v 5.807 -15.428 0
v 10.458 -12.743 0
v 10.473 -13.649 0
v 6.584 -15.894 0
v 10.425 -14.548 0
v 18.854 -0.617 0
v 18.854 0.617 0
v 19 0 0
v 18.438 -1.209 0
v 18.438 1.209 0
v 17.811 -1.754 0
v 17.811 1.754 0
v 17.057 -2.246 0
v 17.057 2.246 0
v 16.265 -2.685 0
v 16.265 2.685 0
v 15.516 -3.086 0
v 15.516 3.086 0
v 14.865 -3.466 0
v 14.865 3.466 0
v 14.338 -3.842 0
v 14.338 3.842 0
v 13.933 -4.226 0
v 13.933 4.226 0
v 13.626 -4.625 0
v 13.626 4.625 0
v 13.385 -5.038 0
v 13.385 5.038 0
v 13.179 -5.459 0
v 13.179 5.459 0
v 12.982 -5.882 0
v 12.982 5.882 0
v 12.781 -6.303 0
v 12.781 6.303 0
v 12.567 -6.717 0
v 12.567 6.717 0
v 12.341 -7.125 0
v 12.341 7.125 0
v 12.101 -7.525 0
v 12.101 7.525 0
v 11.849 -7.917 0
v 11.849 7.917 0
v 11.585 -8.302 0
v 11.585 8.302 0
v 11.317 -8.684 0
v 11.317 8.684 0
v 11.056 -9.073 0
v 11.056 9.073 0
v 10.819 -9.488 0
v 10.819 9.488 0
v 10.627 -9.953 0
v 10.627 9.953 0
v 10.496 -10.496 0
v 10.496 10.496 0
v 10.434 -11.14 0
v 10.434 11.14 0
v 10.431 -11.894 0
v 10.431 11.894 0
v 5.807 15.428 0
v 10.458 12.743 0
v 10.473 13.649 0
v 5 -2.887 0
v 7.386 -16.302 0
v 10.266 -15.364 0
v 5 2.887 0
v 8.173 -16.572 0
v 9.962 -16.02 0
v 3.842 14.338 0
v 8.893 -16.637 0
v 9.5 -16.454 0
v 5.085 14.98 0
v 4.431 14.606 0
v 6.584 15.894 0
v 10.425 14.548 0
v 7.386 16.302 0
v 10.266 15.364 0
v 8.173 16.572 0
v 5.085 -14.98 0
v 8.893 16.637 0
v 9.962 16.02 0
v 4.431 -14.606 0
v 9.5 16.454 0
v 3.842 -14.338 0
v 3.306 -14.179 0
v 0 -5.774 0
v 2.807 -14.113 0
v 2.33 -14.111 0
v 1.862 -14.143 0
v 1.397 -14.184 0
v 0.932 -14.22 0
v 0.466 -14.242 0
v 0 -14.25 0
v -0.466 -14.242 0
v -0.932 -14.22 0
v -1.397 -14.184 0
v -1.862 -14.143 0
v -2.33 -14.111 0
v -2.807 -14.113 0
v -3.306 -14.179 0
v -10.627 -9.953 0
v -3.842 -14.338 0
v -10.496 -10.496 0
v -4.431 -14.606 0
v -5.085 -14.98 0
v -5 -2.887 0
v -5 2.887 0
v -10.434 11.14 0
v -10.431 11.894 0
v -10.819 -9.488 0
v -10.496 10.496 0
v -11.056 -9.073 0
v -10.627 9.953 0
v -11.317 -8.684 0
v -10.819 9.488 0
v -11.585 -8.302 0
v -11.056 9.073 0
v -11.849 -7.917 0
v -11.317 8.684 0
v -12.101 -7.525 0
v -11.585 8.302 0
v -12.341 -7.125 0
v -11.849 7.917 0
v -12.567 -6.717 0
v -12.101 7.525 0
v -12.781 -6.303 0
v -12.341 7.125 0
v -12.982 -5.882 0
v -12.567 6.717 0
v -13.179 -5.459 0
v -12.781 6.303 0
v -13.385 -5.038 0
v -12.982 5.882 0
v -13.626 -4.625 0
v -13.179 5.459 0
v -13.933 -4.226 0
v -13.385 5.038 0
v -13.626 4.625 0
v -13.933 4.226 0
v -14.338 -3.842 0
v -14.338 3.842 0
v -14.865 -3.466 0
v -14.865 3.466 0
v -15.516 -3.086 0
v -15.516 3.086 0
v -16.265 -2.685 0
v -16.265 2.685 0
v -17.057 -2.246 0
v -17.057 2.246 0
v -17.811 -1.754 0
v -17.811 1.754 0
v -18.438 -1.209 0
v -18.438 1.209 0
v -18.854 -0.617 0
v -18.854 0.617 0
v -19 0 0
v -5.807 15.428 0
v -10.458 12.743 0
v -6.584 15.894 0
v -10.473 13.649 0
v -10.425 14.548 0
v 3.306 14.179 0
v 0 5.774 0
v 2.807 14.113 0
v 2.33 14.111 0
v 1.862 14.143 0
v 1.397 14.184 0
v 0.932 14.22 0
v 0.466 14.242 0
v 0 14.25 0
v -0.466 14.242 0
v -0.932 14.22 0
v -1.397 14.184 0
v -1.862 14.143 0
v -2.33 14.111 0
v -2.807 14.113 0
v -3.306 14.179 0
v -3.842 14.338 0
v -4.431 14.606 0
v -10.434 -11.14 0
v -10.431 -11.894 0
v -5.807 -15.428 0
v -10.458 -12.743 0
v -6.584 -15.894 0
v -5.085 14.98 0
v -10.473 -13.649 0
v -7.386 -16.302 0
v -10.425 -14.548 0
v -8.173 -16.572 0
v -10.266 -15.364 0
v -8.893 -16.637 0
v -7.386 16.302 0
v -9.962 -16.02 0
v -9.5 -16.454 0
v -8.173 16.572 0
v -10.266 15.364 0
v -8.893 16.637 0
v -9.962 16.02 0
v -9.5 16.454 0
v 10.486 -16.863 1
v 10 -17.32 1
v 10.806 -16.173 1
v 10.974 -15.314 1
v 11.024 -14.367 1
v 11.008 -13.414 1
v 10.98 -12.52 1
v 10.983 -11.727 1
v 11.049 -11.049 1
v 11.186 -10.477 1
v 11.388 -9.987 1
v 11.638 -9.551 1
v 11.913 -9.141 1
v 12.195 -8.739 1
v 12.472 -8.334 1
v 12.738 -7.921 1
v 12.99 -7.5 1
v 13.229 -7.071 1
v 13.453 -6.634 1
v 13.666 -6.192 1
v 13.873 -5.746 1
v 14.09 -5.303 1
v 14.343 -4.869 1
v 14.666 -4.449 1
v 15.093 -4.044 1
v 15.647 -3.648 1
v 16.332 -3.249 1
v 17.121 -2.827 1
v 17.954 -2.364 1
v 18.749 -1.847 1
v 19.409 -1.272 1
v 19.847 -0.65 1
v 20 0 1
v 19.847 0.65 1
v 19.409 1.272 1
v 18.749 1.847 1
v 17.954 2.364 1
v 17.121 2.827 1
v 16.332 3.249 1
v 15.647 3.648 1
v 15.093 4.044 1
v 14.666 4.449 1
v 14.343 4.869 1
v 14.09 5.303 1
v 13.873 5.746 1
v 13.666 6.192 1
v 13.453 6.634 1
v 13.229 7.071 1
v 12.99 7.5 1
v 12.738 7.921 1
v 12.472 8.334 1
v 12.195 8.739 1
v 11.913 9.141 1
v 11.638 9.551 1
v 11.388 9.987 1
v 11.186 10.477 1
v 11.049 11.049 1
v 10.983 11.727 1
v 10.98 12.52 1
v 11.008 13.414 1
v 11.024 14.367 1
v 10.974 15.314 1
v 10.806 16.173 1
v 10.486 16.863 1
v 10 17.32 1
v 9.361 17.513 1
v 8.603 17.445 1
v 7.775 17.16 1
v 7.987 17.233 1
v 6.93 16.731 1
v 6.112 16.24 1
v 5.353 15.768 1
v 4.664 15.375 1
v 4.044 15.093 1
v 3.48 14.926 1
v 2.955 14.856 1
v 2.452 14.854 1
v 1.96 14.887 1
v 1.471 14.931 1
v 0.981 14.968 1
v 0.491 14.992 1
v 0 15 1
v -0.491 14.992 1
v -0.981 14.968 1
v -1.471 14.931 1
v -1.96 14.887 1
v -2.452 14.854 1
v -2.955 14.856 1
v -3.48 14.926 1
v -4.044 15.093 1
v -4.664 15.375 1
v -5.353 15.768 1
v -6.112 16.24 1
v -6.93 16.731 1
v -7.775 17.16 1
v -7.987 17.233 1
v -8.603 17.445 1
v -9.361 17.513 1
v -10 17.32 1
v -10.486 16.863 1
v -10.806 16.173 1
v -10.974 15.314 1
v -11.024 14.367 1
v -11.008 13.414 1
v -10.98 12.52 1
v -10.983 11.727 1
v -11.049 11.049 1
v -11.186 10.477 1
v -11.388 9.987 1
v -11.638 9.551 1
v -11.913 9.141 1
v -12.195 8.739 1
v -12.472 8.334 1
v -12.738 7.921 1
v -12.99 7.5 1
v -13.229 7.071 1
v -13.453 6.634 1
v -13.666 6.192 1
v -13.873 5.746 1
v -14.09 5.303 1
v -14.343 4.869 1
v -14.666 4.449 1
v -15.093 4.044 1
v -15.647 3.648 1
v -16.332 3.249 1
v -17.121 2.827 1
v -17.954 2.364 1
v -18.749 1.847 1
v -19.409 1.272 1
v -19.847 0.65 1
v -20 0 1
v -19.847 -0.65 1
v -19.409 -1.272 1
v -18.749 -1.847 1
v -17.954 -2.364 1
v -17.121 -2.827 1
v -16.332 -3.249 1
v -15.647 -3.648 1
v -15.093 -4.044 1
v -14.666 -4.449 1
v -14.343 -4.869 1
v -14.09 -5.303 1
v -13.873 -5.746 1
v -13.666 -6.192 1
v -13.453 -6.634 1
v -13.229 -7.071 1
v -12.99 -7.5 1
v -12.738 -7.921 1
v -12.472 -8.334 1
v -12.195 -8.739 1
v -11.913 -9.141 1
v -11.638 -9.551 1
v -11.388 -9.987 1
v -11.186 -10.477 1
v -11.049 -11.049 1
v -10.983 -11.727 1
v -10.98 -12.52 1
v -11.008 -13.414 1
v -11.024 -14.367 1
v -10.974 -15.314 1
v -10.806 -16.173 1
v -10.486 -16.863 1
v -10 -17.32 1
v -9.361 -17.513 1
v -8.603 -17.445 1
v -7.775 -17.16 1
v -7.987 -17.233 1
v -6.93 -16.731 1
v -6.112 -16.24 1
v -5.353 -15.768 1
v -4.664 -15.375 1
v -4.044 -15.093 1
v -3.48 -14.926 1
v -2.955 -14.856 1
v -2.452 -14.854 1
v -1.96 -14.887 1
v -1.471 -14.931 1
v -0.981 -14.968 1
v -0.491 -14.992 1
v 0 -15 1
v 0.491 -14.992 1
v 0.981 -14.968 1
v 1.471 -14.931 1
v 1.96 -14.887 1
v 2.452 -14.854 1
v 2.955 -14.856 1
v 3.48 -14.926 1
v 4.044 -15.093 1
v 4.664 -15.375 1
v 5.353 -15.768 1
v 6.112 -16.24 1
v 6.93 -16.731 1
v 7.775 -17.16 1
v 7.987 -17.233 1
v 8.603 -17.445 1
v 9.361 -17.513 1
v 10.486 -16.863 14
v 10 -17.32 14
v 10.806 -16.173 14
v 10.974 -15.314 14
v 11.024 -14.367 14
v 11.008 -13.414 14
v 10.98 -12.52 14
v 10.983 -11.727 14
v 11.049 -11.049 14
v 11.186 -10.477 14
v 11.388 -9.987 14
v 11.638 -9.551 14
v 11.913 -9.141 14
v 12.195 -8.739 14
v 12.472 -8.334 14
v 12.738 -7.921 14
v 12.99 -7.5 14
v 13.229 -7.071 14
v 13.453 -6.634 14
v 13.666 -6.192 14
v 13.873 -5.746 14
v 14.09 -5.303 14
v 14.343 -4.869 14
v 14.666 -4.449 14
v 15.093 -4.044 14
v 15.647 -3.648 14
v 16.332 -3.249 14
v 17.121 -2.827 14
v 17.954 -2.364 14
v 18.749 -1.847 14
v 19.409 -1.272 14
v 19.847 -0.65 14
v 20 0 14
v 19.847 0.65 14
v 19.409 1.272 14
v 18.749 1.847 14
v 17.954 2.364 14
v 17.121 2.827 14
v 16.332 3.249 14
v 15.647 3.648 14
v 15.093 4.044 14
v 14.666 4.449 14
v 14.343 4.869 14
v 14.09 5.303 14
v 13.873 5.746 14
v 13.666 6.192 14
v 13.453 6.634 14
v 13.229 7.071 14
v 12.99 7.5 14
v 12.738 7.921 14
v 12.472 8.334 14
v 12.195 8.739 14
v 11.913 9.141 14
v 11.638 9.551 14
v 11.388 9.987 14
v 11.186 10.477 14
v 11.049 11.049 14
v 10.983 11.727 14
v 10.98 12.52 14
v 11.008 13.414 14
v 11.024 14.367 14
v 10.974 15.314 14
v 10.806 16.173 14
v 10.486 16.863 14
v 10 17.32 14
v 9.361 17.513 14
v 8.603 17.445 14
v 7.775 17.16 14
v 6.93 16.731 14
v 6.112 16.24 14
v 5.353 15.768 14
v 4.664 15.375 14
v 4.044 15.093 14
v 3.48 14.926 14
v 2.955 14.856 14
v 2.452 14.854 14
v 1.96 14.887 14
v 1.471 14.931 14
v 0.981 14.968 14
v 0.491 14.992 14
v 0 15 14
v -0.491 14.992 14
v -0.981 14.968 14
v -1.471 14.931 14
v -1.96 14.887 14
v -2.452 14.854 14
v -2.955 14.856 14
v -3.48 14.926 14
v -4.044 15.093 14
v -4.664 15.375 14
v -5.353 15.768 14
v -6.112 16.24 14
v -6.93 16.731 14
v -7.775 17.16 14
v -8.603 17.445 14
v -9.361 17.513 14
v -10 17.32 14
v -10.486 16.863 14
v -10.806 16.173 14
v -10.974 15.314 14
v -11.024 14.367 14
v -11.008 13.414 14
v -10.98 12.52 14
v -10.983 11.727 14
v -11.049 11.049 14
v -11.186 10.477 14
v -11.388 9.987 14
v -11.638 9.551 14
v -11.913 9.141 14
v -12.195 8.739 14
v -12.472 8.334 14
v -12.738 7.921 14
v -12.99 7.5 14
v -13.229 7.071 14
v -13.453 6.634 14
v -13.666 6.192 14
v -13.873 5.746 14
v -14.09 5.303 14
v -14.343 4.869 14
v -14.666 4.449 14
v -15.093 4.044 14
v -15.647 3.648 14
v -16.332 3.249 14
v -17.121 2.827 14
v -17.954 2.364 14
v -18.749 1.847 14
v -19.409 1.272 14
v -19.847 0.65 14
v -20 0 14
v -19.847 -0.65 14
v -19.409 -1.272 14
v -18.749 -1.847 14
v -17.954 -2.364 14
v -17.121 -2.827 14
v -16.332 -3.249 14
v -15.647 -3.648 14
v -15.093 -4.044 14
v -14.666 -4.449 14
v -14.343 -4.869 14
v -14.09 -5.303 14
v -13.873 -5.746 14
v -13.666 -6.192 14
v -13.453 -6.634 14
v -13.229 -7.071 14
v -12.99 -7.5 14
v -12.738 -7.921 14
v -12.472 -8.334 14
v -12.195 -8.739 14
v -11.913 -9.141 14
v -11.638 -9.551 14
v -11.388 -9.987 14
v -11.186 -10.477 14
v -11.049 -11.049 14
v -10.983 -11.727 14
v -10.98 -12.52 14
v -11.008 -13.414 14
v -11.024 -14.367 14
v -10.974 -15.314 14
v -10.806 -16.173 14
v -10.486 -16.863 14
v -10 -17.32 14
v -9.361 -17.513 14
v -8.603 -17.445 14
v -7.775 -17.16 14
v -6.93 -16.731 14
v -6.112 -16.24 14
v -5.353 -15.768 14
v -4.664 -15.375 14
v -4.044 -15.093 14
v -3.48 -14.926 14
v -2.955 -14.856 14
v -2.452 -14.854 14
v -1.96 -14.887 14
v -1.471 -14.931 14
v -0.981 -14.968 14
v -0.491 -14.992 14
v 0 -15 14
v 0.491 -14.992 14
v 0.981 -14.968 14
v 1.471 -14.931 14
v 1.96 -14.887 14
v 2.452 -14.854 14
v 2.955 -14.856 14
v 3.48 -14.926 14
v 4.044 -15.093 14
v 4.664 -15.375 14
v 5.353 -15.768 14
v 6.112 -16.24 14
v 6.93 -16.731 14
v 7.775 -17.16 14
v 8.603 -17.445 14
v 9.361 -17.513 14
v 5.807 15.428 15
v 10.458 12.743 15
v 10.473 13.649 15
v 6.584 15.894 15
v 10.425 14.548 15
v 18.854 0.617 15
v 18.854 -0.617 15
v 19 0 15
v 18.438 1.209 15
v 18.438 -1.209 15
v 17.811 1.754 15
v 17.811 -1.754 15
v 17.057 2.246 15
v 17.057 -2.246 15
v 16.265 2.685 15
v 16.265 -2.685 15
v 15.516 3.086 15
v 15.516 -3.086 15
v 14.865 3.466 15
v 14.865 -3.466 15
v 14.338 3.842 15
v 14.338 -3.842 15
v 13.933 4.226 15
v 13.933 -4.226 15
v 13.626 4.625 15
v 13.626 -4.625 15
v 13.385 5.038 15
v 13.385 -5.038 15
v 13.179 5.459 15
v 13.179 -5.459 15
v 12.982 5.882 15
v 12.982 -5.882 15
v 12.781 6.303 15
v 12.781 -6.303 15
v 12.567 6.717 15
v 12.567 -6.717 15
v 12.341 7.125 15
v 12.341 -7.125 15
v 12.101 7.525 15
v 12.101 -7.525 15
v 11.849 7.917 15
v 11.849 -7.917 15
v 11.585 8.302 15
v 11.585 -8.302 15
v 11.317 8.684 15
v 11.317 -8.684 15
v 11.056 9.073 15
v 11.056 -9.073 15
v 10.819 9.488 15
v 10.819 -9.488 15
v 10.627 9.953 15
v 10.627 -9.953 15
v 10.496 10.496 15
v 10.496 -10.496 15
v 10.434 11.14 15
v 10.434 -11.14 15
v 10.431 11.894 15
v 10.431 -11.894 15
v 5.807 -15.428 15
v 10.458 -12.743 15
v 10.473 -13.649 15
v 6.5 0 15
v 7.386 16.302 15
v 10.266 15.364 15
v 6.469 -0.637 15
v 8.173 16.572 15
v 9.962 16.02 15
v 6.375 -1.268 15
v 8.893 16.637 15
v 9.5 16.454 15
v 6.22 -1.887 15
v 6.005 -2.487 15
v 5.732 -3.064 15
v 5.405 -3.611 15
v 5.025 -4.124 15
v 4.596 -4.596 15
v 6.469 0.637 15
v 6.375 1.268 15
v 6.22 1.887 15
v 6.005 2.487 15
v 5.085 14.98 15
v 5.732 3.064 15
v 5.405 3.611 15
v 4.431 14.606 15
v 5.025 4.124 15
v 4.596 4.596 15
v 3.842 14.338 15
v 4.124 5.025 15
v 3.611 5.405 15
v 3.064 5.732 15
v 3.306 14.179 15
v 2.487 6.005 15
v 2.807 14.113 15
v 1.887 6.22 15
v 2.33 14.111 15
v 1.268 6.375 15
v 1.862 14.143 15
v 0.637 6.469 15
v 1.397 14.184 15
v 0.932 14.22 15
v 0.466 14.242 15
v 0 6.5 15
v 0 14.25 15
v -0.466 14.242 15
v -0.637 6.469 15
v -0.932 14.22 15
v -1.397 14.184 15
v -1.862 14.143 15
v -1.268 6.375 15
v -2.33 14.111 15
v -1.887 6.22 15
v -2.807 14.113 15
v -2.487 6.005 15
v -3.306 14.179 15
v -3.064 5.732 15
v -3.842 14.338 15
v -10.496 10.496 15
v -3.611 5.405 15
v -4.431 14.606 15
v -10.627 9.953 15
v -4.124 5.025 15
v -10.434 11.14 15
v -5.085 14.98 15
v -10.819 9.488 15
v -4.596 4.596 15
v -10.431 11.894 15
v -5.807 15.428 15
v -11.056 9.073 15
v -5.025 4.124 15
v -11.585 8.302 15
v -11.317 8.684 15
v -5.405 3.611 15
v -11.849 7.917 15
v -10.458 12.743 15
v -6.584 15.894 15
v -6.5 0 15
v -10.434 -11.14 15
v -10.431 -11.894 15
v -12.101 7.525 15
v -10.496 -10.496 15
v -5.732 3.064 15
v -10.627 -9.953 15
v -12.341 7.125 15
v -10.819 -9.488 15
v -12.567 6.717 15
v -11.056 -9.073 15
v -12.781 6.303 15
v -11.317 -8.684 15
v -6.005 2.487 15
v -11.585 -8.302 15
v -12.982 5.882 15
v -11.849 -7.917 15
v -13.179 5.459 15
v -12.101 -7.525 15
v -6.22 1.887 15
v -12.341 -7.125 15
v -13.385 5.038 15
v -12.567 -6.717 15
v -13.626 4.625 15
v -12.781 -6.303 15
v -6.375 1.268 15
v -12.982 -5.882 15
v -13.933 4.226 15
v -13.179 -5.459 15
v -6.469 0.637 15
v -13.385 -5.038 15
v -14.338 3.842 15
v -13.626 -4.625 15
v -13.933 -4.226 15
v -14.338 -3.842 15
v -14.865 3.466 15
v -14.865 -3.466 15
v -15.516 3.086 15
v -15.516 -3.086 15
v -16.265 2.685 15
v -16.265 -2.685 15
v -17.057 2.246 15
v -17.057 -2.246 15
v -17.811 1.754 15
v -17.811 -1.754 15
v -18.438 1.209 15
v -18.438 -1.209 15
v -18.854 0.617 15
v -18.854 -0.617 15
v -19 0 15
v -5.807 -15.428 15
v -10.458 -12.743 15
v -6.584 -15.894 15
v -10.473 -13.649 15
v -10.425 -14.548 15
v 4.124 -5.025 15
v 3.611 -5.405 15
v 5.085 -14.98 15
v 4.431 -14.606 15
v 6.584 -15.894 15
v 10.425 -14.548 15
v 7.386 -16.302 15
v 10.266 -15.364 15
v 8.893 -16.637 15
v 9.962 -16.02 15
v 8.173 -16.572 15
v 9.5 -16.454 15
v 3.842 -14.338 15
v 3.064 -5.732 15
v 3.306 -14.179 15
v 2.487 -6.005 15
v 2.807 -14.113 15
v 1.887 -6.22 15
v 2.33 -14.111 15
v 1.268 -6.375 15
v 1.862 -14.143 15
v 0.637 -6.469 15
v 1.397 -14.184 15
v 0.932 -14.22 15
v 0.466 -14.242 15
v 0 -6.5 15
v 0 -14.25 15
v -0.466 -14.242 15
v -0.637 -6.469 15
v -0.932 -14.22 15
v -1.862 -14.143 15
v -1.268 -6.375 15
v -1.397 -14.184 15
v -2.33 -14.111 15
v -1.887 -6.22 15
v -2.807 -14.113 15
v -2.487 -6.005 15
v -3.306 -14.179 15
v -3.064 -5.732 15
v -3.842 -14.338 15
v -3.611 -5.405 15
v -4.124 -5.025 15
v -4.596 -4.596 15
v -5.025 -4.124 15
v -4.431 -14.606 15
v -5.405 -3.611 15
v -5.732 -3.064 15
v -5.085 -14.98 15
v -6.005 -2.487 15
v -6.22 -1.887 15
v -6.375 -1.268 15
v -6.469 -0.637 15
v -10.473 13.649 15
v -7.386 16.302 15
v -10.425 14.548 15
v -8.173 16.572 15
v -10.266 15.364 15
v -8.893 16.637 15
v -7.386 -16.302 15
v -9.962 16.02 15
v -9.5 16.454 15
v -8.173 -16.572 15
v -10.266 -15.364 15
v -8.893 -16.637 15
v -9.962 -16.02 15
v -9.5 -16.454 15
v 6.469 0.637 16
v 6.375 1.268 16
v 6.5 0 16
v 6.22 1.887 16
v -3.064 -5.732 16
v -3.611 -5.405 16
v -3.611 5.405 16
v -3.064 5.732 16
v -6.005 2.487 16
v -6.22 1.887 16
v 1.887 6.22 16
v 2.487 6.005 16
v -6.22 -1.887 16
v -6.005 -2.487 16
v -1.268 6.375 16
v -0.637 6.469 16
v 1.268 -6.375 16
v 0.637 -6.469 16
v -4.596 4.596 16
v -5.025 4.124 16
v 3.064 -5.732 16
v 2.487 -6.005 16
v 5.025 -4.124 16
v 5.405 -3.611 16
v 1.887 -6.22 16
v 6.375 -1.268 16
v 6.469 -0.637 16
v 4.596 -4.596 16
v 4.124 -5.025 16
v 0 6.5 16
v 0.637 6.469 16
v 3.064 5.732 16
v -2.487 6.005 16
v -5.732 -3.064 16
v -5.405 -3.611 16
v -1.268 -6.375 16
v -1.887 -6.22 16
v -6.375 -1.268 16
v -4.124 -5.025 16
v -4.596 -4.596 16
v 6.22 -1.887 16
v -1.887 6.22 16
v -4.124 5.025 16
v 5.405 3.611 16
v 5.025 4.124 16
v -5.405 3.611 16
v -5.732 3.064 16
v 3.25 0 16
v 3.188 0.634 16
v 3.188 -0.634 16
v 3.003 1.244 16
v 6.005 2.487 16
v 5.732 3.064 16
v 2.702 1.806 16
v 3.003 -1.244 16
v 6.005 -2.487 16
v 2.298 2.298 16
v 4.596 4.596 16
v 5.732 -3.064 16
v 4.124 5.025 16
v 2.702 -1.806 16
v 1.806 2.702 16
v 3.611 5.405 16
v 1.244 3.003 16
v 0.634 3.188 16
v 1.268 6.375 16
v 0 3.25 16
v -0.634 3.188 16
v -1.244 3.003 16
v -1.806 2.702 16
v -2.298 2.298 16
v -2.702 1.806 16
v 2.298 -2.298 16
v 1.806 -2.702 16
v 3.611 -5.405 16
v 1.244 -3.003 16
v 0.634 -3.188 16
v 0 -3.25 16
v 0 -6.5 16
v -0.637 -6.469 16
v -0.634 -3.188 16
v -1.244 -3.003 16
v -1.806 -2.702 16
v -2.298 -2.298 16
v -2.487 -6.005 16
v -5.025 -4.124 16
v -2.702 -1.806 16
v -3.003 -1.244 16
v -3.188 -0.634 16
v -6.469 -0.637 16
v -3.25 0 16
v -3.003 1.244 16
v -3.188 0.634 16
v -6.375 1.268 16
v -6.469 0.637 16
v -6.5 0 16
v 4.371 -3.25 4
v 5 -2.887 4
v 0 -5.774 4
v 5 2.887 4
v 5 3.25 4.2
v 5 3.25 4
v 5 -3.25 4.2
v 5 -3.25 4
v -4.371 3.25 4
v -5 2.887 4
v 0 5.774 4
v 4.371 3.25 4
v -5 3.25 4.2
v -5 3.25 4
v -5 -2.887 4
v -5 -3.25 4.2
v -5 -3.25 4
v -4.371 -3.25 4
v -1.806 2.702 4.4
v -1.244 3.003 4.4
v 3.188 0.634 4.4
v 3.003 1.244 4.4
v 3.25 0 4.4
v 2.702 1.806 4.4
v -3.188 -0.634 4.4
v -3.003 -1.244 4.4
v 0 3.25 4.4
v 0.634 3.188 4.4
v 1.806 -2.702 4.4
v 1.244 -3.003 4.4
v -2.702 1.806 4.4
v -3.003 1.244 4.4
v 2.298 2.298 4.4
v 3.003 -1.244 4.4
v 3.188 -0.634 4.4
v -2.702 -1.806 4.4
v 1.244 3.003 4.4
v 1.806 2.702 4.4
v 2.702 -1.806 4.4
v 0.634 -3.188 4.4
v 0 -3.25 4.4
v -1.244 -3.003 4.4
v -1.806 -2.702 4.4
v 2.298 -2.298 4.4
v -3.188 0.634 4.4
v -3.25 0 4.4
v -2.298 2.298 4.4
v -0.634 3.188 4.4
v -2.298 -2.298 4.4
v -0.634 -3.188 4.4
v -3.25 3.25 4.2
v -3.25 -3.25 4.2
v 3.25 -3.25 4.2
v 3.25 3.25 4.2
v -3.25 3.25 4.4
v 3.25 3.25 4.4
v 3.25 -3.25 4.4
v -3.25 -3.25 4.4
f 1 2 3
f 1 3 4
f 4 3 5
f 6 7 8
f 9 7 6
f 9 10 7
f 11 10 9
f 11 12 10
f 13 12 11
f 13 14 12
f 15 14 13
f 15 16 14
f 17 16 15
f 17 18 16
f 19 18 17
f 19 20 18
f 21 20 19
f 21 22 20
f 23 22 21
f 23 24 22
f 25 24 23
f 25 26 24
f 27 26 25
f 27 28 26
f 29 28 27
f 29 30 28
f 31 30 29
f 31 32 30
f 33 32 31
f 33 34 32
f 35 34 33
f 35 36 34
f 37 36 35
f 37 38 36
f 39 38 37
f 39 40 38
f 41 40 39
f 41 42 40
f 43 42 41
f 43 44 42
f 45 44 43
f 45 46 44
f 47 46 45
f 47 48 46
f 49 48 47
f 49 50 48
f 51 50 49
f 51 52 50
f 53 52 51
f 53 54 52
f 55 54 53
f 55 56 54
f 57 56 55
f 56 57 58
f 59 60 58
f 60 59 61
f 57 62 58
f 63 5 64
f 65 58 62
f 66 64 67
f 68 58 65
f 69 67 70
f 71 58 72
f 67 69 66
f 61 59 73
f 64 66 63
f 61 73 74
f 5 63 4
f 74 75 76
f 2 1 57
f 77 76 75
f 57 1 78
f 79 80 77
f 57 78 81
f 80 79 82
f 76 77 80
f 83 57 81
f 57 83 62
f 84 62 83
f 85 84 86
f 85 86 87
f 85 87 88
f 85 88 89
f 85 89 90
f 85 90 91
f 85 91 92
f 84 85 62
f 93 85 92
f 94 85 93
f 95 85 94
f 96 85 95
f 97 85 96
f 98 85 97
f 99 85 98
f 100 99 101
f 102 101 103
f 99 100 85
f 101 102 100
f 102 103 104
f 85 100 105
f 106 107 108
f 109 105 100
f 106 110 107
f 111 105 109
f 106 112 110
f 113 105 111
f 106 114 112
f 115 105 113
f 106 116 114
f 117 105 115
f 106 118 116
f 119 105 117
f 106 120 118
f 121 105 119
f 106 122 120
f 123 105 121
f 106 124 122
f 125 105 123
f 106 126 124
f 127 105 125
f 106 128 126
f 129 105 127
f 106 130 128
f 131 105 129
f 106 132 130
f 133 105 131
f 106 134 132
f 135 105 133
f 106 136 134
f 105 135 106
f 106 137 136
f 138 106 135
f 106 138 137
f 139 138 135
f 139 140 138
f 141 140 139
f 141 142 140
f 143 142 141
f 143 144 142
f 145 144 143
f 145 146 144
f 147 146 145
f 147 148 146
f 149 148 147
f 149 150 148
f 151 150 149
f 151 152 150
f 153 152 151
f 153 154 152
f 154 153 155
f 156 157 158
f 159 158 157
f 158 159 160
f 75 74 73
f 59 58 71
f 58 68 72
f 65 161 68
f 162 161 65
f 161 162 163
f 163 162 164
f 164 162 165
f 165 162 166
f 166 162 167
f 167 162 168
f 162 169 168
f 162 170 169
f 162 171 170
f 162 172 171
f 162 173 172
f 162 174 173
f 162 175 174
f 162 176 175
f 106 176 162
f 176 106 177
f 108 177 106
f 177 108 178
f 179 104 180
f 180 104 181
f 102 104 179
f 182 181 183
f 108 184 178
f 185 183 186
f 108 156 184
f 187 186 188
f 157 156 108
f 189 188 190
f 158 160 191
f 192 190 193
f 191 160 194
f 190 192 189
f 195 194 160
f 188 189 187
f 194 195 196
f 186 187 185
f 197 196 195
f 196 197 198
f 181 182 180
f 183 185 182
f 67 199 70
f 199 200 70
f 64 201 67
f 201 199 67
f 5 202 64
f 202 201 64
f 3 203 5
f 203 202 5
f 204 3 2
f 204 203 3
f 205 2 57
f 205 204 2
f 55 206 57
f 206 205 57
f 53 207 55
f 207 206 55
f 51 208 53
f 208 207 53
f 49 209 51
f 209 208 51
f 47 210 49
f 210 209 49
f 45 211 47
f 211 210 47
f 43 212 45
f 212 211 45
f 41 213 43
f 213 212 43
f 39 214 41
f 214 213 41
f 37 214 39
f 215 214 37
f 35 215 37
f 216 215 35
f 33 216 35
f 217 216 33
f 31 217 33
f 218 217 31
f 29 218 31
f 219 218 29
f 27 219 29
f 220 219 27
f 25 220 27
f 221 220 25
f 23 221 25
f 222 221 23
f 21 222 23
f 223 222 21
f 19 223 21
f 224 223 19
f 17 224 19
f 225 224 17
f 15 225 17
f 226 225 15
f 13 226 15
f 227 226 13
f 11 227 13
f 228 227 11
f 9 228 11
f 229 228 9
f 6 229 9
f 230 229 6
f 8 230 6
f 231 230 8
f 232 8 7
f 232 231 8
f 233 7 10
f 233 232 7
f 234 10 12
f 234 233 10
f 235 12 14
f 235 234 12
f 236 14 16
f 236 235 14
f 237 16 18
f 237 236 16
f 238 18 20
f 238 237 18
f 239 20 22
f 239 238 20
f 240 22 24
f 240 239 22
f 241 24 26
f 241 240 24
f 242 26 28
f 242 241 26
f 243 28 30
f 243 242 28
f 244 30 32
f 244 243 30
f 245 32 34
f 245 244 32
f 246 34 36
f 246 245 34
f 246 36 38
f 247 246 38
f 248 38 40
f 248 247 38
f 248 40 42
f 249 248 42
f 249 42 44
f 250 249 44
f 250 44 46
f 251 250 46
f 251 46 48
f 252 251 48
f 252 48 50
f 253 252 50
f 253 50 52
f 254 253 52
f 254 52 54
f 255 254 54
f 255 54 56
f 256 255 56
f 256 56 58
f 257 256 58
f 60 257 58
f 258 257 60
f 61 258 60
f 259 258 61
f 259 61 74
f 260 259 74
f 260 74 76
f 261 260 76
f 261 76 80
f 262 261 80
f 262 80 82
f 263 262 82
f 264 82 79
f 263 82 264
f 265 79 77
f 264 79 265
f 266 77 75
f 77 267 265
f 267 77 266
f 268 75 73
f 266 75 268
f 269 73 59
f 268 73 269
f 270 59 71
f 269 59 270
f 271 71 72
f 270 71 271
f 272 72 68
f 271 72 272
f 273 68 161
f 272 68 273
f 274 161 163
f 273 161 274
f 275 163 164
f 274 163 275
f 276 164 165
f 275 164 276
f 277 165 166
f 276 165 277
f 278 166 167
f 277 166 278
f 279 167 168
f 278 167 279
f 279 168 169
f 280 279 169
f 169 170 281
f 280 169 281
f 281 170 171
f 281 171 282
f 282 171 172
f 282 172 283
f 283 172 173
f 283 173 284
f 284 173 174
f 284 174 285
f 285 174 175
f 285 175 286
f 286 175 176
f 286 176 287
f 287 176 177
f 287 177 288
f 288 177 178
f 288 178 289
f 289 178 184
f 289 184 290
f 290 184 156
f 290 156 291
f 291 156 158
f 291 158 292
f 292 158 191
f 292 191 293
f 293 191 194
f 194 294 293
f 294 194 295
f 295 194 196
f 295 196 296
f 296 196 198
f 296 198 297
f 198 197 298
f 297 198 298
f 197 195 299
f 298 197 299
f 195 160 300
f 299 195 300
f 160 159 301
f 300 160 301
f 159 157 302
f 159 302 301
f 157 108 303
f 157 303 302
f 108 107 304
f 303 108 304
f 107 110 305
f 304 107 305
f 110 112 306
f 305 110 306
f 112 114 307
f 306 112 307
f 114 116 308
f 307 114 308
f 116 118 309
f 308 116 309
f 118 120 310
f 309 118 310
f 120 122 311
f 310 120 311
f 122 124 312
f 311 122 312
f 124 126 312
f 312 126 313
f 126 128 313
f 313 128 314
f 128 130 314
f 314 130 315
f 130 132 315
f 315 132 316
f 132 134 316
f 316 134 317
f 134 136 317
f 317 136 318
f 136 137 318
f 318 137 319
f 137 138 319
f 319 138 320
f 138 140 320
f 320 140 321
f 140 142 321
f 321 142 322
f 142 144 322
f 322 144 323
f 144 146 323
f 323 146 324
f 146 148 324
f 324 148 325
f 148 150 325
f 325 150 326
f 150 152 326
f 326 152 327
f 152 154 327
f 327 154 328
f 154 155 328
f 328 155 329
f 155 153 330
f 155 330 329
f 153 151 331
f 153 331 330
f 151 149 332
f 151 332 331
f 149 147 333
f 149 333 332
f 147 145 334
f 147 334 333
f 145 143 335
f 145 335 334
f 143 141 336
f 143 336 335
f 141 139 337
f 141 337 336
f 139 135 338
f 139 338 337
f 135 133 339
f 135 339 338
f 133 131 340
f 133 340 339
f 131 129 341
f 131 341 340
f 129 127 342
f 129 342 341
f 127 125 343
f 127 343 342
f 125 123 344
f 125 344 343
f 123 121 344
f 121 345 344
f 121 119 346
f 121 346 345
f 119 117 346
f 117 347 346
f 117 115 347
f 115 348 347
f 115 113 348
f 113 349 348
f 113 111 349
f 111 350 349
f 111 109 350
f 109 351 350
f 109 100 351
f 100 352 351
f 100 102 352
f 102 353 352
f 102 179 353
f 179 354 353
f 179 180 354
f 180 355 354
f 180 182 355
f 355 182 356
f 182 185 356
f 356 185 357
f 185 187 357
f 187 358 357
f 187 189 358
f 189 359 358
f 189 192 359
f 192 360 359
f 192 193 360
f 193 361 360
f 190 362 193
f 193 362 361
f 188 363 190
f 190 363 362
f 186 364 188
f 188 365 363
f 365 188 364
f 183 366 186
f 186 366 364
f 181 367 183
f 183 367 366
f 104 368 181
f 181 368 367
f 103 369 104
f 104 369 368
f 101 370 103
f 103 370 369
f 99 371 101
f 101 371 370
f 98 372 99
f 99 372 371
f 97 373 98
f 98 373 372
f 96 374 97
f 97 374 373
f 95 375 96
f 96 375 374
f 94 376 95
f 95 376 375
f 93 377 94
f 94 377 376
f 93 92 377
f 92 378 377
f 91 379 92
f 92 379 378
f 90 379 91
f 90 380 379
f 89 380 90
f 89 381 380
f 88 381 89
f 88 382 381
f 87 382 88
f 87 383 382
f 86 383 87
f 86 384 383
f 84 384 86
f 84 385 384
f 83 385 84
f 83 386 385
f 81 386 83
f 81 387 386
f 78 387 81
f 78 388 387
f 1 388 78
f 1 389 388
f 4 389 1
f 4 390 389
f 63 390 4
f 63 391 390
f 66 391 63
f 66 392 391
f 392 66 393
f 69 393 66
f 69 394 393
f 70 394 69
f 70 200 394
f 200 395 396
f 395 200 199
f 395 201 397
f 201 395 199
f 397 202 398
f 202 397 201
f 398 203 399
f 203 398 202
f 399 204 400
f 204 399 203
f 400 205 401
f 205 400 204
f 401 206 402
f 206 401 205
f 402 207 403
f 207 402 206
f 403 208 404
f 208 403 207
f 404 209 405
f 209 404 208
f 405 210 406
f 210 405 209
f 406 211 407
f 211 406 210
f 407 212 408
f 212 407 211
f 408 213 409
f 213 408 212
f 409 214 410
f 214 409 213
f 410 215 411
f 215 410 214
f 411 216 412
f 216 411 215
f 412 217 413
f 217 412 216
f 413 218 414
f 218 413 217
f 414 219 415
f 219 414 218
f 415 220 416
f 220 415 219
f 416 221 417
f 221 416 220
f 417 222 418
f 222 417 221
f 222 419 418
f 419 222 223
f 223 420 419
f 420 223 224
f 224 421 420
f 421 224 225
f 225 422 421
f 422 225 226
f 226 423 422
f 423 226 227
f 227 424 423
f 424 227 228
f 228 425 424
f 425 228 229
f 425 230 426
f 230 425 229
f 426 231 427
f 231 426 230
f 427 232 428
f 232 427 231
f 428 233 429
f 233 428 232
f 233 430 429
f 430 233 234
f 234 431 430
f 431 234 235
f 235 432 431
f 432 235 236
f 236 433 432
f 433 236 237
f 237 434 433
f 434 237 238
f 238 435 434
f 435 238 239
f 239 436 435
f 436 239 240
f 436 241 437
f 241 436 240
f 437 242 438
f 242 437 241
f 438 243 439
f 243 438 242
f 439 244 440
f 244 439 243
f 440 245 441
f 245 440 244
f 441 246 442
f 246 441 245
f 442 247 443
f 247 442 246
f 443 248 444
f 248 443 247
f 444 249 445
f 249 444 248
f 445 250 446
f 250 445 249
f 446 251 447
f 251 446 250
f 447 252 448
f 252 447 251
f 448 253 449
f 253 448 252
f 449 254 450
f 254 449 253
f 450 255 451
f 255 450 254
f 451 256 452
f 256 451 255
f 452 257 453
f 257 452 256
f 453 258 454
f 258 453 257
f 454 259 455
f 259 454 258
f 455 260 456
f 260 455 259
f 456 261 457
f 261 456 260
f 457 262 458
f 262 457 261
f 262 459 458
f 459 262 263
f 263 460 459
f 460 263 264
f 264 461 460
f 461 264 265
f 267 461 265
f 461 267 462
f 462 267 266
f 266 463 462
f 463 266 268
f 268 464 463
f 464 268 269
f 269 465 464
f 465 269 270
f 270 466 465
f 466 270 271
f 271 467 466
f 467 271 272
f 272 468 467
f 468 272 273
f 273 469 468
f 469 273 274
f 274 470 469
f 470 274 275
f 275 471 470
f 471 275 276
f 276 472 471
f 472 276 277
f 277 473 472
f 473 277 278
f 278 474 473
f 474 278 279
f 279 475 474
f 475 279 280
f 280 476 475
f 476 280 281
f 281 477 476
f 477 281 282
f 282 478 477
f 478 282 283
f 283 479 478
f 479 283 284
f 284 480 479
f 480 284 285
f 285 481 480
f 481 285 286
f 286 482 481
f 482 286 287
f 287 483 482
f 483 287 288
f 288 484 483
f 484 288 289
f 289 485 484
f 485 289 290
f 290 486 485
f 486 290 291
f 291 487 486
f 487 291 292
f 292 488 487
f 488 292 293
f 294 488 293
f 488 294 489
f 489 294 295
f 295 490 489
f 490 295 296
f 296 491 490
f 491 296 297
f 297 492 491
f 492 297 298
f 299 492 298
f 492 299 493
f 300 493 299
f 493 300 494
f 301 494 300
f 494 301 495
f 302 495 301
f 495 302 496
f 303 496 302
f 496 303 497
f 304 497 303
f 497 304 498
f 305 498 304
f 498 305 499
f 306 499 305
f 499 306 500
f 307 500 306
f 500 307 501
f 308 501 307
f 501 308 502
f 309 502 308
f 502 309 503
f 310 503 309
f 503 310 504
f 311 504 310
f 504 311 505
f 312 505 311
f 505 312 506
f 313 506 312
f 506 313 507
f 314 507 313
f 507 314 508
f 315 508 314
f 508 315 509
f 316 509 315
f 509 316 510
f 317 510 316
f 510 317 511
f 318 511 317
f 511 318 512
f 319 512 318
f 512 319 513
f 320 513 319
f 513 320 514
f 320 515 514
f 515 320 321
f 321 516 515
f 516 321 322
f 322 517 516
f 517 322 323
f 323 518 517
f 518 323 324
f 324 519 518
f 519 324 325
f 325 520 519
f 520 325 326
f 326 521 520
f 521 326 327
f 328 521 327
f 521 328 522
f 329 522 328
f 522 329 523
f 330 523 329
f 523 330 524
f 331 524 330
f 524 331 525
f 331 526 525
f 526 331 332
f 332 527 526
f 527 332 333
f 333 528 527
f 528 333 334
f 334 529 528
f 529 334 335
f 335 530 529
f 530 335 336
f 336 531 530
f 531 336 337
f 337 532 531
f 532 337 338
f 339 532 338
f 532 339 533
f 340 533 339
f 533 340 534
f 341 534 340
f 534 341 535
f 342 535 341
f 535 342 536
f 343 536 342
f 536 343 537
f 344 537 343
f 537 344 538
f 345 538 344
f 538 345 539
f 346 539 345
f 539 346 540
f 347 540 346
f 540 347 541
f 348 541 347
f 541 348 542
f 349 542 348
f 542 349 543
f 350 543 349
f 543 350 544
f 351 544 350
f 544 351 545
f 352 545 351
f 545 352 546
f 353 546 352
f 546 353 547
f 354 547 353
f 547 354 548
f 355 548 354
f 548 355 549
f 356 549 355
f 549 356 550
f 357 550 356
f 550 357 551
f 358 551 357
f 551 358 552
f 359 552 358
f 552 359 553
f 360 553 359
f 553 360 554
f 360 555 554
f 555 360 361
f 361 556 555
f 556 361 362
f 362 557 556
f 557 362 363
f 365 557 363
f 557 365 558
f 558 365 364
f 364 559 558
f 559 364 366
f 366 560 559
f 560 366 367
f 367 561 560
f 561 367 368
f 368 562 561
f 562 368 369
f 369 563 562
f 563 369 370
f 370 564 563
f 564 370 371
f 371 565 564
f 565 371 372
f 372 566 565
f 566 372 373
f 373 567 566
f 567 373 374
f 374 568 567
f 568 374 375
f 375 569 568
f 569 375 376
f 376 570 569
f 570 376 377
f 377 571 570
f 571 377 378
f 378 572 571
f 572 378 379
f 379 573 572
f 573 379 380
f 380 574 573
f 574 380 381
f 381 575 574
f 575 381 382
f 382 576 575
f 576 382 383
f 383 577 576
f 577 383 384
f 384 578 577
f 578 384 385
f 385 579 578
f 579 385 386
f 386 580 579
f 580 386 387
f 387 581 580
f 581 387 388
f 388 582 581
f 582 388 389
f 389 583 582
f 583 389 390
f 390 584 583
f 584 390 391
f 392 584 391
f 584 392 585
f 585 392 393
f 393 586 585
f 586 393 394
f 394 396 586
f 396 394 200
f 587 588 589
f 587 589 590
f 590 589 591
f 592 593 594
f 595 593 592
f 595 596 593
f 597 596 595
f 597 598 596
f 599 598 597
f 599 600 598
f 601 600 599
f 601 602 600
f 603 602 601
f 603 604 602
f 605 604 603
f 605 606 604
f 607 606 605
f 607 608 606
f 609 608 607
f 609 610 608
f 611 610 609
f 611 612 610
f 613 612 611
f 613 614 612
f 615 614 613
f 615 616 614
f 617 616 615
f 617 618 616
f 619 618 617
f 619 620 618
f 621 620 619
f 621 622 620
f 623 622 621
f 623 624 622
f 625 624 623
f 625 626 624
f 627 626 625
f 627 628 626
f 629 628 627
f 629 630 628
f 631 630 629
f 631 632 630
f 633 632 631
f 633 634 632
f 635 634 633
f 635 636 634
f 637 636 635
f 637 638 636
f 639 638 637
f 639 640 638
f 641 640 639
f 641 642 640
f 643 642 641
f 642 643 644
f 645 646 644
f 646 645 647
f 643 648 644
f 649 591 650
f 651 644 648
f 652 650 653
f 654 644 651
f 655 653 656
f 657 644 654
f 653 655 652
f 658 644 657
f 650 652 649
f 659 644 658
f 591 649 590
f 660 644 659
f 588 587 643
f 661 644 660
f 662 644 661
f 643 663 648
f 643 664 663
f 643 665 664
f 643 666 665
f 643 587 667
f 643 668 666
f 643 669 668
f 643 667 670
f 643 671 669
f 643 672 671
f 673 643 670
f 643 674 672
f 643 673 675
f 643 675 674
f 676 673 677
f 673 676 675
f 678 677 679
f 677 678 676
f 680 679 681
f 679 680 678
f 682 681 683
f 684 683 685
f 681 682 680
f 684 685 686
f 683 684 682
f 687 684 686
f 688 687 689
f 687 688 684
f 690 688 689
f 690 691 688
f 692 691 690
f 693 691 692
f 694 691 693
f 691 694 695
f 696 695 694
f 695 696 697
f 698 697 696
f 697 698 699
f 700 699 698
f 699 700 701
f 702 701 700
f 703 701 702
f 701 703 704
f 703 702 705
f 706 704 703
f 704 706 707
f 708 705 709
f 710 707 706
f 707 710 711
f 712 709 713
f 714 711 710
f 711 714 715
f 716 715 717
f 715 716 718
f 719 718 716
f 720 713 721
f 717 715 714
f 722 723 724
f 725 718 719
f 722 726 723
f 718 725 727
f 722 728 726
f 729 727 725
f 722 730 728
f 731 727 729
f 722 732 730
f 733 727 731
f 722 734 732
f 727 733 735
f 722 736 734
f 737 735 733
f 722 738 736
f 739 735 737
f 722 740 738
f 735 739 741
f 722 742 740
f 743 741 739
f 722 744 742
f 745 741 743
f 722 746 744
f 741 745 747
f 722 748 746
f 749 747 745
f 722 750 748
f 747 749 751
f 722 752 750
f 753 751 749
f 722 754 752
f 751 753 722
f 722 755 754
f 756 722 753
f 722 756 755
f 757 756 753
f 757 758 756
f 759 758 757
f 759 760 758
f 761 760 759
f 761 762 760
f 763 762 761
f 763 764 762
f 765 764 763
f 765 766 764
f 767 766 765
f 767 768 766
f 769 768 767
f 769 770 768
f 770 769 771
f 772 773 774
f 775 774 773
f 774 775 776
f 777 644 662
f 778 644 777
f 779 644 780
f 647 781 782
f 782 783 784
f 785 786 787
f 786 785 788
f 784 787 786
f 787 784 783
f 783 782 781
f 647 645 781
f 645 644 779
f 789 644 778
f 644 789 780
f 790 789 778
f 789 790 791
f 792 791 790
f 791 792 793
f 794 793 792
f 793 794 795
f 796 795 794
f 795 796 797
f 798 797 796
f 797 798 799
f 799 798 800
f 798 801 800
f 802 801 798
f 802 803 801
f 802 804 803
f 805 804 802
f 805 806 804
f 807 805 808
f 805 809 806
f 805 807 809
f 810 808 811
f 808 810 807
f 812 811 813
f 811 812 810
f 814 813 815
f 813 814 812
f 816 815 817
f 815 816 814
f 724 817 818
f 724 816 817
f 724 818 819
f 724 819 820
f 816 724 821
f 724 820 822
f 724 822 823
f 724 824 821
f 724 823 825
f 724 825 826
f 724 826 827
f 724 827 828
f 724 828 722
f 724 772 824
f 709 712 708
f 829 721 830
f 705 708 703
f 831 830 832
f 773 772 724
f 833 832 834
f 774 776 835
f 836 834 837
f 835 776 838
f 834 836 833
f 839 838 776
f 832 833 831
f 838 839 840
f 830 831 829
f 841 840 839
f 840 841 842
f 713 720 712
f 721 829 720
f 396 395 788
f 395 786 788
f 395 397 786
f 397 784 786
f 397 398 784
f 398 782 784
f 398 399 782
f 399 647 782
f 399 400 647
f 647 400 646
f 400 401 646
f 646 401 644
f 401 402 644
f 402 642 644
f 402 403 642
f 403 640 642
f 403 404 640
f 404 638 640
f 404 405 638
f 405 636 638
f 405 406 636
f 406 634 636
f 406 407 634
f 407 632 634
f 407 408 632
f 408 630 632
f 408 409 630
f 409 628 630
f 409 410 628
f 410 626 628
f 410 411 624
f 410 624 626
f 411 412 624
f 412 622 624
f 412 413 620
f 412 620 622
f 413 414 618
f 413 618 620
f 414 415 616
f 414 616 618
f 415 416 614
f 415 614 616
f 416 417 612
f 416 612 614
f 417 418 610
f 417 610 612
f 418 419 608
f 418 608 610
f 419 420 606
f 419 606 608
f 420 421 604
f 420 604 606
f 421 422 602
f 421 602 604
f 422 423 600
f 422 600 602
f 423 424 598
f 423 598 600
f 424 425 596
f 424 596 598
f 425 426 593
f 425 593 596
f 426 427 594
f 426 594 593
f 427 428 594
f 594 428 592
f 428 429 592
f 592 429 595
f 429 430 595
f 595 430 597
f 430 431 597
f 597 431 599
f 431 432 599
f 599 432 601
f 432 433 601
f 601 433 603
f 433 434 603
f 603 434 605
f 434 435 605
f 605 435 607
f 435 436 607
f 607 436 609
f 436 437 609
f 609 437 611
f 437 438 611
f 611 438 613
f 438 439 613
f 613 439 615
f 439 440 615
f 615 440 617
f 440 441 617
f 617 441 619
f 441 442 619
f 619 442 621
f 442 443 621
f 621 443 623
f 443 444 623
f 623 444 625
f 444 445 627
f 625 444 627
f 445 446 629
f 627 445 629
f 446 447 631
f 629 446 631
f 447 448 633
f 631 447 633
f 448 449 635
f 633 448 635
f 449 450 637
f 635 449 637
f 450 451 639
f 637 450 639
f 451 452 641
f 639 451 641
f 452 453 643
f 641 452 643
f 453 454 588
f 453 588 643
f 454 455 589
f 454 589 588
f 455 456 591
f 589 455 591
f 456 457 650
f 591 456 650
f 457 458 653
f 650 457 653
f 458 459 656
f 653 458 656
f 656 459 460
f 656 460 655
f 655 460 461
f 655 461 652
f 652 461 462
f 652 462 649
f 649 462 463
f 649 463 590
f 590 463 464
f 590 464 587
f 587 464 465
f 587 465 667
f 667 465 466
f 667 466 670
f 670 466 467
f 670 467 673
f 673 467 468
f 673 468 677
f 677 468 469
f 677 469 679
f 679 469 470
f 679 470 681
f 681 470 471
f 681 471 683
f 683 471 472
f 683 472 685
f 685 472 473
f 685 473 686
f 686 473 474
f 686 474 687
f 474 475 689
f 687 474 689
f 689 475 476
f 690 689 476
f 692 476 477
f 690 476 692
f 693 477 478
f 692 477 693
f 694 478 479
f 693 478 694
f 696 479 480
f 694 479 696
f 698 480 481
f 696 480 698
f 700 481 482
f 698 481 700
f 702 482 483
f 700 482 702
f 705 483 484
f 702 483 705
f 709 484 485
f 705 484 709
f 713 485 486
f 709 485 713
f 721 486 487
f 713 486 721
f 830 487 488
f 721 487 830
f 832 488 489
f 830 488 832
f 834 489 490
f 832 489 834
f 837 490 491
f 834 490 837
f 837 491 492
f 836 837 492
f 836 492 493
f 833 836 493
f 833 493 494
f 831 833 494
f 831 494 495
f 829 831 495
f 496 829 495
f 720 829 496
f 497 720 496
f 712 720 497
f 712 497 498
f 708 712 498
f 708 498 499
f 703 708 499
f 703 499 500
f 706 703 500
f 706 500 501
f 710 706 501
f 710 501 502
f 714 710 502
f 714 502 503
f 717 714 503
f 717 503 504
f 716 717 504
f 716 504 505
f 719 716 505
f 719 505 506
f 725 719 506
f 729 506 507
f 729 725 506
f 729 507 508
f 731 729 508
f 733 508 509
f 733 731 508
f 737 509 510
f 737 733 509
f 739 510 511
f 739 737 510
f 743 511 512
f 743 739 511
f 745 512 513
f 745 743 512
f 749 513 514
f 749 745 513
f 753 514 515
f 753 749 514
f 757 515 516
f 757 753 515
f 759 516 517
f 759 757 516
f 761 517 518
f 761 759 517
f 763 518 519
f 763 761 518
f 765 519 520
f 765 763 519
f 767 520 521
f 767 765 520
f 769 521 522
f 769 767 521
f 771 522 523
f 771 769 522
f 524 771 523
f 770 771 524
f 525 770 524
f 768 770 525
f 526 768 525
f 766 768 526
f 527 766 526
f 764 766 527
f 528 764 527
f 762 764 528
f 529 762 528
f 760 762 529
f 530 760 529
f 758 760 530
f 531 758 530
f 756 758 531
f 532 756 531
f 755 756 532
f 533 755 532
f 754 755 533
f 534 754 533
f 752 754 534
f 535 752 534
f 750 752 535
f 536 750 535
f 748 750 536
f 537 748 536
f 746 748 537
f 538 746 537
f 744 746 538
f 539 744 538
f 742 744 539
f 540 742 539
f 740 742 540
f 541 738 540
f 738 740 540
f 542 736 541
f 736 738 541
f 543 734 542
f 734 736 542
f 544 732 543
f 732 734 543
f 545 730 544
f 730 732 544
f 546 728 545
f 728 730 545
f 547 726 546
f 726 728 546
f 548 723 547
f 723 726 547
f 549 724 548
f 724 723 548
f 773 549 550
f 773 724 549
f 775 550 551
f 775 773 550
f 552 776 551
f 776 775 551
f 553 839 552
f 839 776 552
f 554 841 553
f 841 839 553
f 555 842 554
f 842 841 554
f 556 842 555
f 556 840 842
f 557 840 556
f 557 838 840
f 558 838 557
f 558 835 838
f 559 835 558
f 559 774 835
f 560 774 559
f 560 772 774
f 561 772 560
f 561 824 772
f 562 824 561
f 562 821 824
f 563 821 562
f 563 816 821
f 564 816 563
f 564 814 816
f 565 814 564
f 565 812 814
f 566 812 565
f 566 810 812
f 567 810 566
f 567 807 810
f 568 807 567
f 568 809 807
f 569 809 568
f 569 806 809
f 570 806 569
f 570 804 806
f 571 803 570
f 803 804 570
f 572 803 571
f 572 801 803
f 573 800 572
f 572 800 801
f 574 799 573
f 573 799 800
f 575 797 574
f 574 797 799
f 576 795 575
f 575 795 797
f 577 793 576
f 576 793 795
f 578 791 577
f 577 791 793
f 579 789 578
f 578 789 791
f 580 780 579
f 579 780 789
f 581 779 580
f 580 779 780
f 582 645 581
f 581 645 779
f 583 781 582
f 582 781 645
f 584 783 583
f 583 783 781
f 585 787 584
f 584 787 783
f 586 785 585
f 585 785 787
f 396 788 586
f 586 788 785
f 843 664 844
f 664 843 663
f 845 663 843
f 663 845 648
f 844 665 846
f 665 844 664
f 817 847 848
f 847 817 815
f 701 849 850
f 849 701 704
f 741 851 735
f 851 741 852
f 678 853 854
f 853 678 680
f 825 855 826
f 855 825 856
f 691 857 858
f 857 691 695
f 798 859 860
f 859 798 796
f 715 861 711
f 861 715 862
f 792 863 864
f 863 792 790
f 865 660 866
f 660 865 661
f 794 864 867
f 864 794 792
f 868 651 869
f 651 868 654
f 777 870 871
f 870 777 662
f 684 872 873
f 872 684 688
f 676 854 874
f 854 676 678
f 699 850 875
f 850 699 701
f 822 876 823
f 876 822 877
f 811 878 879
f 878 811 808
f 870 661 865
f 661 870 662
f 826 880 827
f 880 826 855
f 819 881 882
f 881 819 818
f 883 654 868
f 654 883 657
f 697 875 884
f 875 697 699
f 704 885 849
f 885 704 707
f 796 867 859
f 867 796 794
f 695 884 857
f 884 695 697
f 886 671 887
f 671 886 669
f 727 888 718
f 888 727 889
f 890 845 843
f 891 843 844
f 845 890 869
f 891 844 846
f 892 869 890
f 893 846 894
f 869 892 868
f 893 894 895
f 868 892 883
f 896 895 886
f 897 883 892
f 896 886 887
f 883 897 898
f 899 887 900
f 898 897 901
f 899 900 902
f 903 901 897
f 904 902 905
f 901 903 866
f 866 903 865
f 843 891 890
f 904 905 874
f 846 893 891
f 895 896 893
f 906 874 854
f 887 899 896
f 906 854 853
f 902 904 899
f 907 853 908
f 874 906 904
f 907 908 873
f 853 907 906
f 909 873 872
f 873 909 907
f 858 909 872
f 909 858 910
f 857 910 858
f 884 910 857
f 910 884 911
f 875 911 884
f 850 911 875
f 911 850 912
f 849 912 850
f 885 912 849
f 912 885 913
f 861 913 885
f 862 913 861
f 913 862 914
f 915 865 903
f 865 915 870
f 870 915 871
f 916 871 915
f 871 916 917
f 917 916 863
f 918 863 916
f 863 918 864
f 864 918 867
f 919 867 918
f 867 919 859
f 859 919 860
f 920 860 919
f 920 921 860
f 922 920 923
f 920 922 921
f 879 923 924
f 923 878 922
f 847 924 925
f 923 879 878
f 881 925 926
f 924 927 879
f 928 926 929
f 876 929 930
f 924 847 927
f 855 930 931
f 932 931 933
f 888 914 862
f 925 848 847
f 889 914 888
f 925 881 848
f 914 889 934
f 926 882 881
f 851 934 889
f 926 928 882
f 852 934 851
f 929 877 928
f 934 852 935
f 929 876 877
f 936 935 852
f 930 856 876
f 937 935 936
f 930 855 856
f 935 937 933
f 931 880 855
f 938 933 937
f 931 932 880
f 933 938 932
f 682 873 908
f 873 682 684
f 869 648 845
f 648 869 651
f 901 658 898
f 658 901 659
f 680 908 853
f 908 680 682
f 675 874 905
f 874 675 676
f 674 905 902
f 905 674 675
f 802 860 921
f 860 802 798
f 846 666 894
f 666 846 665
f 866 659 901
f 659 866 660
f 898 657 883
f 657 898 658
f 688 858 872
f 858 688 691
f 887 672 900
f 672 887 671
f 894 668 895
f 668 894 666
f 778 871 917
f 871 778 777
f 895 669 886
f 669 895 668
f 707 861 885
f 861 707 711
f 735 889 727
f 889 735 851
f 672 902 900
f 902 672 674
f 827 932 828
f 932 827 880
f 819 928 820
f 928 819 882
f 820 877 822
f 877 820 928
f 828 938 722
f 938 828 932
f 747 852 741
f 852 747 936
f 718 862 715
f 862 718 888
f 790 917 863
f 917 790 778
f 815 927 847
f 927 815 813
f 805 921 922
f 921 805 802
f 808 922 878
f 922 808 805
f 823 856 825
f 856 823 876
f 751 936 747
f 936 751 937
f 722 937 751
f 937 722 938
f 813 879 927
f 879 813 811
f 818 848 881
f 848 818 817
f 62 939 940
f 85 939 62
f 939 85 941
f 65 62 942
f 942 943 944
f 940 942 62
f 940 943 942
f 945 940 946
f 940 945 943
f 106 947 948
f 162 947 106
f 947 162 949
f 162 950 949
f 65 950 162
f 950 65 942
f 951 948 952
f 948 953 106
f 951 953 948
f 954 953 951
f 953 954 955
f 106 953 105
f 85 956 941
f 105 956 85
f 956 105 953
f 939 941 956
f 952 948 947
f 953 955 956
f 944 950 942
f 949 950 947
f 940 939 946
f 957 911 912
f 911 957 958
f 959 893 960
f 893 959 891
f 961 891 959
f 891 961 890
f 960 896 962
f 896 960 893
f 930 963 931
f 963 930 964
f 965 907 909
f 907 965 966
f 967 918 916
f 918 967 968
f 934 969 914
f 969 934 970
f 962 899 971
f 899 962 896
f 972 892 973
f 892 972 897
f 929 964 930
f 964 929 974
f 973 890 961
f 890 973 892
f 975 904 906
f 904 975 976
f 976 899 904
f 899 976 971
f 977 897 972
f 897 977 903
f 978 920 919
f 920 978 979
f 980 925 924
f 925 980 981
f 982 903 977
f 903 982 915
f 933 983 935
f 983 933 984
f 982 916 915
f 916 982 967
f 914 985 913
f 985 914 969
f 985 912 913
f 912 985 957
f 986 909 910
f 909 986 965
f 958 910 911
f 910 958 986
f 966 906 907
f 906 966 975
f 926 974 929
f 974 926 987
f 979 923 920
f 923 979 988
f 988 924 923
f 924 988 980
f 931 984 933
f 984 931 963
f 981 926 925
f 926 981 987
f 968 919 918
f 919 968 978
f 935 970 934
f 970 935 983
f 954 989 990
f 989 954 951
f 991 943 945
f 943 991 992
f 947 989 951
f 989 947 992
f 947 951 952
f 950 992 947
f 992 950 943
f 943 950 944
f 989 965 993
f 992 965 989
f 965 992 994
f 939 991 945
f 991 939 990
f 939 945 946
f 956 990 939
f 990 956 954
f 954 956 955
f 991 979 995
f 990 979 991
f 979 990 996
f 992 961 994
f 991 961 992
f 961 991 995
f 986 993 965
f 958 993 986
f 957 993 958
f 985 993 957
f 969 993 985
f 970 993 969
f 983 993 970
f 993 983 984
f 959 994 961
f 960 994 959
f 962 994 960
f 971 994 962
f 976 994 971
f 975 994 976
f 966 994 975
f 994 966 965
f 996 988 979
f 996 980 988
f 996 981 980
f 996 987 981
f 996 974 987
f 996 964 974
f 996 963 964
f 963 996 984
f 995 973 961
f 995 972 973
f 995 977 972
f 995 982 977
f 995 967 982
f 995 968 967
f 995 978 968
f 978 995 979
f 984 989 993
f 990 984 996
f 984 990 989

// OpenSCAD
// Knob / Thumbscrew — Parametric Model
// All dimensions in mm
//
// Orientation:
//   Bottom face (Z = 0) — nut/bolt head pocket faces down on the print bed
//   Top face    (Z = knob_thickness) — circular alignment nub on top
//
// Print with pocket facing down (no supports needed).

// --- Knob Shape ---
n_prongs       = 6;    // Number of prongs (2–100)
outer_diameter = 40;   // Diameter at prong tips, mm
valley_depth   = 5;    // Radial depth of valleys between prongs, mm
knob_thickness = 15;   // Body height, mm

// --- Bolt / Nut Dimensions ---
head_width     = 10;   // Hex head flat-to-flat (nut AF), mm
head_height    = 4;    // Hex head / nut thickness, mm
shaft_diameter = 6.5;  // Bolt shaft clearance diameter, mm

// --- Fixed ---
layer_height = 0.2;    // Bridge step height for support-free printing
knob_chamfer = 1;      // 45-degree chamfer depth on outer top/bottom edges, mm

// Derived
outer_radius = outer_diameter / 2;
inner_radius = outer_radius - valley_depth;
head_radius  = head_width / 2 / cos(30);

// Prong sharpness: 1 = symmetric cosine, higher = narrower prongs / wider valleys.
prong_sharpness = 3;

// 2D prong profile: powered cosine wave — prongs are narrow spikes, valleys are
// broad and flat. t = ((cos + 1)/2)^sharpness is still 0 at valleys and 1 at
// peaks, but spends most of its range near 0 (wide valley) and rises sharply
// only near the peak (narrow prong).
module knob_profile_2d() {
    steps = max(128, n_prongs * 32);
    pts = [for (i = [0 : steps - 1])
        let (a  = i * 360 / steps,
             t  = pow((cos(a * n_prongs) + 1) / 2, prong_sharpness),
             r  = inner_radius + (outer_radius - inner_radius) * t)
        [r * cos(a), r * sin(a)]
    ];
    polygon(pts);
}

// Main knob body with 45-degree chamfer that follows the full wave contour —
// both prong tips AND valley bottoms are chamfered uniformly.
//
// Strategy: three stacked linear_extrudes.
//   bottom chamfer — scales the profile from s (inset) at z=0 to 1.0 at z=ch
//   middle body    — full profile, constant height
//   top chamfer    — scales from 1.0 at z=0 to s (inset) at z=ch
// where s = (outer_radius − ch) / outer_radius gives a 45° bevel referenced
// to the prong tip radius. The chamfer depth at inner points scales with r,
// deviating from a strict offset by < ch*(1−inner/outer) — less than 0.3 mm
// for the defaults — which is well within 3-D-printing tolerance.
module knob_body() {
    ch = knob_chamfer;
    s  = (outer_radius - ch) / outer_radius;   // scale factor for chamfer face

    union() {
        // Bottom chamfer: inset face at z=0, full face at z=ch
        linear_extrude(ch, scale = 1 / s)
        scale(s)
        knob_profile_2d();

        // Middle body
        translate([0, 0, ch])
        linear_extrude(knob_thickness - 2 * ch)
        knob_profile_2d();

        // Top chamfer: full face at z=0 (local), inset face at z=ch (local)
        translate([0, 0, knob_thickness - ch])
        linear_extrude(ch, scale = s)
        knob_profile_2d();
    }
}

// Circular alignment / tool-start nub on the top face.
// 1 mm thick, diameter = 2× shaft_diameter.
module top_protrusion() {
    translate([0, 0, knob_thickness])
    cylinder(h = 1, d = shaft_diameter * 2, $fn = 64);
}

// Hex pocket in the bottom face (receives bolt head or nut).
// Rotated 30° so two flat faces are parallel to ±X, minimising width used.
module hex_pocket() {
    translate([0, 0, -0.01])
    rotate([0, 0, 30])
    cylinder(h = head_height + 0.01, r = head_radius, $fn = 6);
}

// Clearance hole for bolt shaft through the full height (body + nub).
module shaft_hole() {
    translate([0, 0, -0.01])
    cylinder(h = knob_thickness + 1 + 0.02, d = shaft_diameter, $fn = 32);
}

// Bridging steps at the ceiling of the hex pocket — enable support-free printing.
module bridge_step() {
    // Slot spanning the full hex width, shaft-hole deep — lets the printer bridge.
    translate([-head_width/2, -shaft_diameter/2, head_height])
    cube([head_width, shaft_diameter, layer_height]);
}

module bridge_step_square() {
    // Second layer — square slot centred on the shaft axis.
    translate([-shaft_diameter/2, -shaft_diameter/2, head_height + layer_height])
    cube([shaft_diameter, shaft_diameter, layer_height]);
}

difference() {
    union() {
        knob_body();
        top_protrusion();
    }
    hex_pocket();
    shaft_hole();
    bridge_step();
    bridge_step_square();
}
